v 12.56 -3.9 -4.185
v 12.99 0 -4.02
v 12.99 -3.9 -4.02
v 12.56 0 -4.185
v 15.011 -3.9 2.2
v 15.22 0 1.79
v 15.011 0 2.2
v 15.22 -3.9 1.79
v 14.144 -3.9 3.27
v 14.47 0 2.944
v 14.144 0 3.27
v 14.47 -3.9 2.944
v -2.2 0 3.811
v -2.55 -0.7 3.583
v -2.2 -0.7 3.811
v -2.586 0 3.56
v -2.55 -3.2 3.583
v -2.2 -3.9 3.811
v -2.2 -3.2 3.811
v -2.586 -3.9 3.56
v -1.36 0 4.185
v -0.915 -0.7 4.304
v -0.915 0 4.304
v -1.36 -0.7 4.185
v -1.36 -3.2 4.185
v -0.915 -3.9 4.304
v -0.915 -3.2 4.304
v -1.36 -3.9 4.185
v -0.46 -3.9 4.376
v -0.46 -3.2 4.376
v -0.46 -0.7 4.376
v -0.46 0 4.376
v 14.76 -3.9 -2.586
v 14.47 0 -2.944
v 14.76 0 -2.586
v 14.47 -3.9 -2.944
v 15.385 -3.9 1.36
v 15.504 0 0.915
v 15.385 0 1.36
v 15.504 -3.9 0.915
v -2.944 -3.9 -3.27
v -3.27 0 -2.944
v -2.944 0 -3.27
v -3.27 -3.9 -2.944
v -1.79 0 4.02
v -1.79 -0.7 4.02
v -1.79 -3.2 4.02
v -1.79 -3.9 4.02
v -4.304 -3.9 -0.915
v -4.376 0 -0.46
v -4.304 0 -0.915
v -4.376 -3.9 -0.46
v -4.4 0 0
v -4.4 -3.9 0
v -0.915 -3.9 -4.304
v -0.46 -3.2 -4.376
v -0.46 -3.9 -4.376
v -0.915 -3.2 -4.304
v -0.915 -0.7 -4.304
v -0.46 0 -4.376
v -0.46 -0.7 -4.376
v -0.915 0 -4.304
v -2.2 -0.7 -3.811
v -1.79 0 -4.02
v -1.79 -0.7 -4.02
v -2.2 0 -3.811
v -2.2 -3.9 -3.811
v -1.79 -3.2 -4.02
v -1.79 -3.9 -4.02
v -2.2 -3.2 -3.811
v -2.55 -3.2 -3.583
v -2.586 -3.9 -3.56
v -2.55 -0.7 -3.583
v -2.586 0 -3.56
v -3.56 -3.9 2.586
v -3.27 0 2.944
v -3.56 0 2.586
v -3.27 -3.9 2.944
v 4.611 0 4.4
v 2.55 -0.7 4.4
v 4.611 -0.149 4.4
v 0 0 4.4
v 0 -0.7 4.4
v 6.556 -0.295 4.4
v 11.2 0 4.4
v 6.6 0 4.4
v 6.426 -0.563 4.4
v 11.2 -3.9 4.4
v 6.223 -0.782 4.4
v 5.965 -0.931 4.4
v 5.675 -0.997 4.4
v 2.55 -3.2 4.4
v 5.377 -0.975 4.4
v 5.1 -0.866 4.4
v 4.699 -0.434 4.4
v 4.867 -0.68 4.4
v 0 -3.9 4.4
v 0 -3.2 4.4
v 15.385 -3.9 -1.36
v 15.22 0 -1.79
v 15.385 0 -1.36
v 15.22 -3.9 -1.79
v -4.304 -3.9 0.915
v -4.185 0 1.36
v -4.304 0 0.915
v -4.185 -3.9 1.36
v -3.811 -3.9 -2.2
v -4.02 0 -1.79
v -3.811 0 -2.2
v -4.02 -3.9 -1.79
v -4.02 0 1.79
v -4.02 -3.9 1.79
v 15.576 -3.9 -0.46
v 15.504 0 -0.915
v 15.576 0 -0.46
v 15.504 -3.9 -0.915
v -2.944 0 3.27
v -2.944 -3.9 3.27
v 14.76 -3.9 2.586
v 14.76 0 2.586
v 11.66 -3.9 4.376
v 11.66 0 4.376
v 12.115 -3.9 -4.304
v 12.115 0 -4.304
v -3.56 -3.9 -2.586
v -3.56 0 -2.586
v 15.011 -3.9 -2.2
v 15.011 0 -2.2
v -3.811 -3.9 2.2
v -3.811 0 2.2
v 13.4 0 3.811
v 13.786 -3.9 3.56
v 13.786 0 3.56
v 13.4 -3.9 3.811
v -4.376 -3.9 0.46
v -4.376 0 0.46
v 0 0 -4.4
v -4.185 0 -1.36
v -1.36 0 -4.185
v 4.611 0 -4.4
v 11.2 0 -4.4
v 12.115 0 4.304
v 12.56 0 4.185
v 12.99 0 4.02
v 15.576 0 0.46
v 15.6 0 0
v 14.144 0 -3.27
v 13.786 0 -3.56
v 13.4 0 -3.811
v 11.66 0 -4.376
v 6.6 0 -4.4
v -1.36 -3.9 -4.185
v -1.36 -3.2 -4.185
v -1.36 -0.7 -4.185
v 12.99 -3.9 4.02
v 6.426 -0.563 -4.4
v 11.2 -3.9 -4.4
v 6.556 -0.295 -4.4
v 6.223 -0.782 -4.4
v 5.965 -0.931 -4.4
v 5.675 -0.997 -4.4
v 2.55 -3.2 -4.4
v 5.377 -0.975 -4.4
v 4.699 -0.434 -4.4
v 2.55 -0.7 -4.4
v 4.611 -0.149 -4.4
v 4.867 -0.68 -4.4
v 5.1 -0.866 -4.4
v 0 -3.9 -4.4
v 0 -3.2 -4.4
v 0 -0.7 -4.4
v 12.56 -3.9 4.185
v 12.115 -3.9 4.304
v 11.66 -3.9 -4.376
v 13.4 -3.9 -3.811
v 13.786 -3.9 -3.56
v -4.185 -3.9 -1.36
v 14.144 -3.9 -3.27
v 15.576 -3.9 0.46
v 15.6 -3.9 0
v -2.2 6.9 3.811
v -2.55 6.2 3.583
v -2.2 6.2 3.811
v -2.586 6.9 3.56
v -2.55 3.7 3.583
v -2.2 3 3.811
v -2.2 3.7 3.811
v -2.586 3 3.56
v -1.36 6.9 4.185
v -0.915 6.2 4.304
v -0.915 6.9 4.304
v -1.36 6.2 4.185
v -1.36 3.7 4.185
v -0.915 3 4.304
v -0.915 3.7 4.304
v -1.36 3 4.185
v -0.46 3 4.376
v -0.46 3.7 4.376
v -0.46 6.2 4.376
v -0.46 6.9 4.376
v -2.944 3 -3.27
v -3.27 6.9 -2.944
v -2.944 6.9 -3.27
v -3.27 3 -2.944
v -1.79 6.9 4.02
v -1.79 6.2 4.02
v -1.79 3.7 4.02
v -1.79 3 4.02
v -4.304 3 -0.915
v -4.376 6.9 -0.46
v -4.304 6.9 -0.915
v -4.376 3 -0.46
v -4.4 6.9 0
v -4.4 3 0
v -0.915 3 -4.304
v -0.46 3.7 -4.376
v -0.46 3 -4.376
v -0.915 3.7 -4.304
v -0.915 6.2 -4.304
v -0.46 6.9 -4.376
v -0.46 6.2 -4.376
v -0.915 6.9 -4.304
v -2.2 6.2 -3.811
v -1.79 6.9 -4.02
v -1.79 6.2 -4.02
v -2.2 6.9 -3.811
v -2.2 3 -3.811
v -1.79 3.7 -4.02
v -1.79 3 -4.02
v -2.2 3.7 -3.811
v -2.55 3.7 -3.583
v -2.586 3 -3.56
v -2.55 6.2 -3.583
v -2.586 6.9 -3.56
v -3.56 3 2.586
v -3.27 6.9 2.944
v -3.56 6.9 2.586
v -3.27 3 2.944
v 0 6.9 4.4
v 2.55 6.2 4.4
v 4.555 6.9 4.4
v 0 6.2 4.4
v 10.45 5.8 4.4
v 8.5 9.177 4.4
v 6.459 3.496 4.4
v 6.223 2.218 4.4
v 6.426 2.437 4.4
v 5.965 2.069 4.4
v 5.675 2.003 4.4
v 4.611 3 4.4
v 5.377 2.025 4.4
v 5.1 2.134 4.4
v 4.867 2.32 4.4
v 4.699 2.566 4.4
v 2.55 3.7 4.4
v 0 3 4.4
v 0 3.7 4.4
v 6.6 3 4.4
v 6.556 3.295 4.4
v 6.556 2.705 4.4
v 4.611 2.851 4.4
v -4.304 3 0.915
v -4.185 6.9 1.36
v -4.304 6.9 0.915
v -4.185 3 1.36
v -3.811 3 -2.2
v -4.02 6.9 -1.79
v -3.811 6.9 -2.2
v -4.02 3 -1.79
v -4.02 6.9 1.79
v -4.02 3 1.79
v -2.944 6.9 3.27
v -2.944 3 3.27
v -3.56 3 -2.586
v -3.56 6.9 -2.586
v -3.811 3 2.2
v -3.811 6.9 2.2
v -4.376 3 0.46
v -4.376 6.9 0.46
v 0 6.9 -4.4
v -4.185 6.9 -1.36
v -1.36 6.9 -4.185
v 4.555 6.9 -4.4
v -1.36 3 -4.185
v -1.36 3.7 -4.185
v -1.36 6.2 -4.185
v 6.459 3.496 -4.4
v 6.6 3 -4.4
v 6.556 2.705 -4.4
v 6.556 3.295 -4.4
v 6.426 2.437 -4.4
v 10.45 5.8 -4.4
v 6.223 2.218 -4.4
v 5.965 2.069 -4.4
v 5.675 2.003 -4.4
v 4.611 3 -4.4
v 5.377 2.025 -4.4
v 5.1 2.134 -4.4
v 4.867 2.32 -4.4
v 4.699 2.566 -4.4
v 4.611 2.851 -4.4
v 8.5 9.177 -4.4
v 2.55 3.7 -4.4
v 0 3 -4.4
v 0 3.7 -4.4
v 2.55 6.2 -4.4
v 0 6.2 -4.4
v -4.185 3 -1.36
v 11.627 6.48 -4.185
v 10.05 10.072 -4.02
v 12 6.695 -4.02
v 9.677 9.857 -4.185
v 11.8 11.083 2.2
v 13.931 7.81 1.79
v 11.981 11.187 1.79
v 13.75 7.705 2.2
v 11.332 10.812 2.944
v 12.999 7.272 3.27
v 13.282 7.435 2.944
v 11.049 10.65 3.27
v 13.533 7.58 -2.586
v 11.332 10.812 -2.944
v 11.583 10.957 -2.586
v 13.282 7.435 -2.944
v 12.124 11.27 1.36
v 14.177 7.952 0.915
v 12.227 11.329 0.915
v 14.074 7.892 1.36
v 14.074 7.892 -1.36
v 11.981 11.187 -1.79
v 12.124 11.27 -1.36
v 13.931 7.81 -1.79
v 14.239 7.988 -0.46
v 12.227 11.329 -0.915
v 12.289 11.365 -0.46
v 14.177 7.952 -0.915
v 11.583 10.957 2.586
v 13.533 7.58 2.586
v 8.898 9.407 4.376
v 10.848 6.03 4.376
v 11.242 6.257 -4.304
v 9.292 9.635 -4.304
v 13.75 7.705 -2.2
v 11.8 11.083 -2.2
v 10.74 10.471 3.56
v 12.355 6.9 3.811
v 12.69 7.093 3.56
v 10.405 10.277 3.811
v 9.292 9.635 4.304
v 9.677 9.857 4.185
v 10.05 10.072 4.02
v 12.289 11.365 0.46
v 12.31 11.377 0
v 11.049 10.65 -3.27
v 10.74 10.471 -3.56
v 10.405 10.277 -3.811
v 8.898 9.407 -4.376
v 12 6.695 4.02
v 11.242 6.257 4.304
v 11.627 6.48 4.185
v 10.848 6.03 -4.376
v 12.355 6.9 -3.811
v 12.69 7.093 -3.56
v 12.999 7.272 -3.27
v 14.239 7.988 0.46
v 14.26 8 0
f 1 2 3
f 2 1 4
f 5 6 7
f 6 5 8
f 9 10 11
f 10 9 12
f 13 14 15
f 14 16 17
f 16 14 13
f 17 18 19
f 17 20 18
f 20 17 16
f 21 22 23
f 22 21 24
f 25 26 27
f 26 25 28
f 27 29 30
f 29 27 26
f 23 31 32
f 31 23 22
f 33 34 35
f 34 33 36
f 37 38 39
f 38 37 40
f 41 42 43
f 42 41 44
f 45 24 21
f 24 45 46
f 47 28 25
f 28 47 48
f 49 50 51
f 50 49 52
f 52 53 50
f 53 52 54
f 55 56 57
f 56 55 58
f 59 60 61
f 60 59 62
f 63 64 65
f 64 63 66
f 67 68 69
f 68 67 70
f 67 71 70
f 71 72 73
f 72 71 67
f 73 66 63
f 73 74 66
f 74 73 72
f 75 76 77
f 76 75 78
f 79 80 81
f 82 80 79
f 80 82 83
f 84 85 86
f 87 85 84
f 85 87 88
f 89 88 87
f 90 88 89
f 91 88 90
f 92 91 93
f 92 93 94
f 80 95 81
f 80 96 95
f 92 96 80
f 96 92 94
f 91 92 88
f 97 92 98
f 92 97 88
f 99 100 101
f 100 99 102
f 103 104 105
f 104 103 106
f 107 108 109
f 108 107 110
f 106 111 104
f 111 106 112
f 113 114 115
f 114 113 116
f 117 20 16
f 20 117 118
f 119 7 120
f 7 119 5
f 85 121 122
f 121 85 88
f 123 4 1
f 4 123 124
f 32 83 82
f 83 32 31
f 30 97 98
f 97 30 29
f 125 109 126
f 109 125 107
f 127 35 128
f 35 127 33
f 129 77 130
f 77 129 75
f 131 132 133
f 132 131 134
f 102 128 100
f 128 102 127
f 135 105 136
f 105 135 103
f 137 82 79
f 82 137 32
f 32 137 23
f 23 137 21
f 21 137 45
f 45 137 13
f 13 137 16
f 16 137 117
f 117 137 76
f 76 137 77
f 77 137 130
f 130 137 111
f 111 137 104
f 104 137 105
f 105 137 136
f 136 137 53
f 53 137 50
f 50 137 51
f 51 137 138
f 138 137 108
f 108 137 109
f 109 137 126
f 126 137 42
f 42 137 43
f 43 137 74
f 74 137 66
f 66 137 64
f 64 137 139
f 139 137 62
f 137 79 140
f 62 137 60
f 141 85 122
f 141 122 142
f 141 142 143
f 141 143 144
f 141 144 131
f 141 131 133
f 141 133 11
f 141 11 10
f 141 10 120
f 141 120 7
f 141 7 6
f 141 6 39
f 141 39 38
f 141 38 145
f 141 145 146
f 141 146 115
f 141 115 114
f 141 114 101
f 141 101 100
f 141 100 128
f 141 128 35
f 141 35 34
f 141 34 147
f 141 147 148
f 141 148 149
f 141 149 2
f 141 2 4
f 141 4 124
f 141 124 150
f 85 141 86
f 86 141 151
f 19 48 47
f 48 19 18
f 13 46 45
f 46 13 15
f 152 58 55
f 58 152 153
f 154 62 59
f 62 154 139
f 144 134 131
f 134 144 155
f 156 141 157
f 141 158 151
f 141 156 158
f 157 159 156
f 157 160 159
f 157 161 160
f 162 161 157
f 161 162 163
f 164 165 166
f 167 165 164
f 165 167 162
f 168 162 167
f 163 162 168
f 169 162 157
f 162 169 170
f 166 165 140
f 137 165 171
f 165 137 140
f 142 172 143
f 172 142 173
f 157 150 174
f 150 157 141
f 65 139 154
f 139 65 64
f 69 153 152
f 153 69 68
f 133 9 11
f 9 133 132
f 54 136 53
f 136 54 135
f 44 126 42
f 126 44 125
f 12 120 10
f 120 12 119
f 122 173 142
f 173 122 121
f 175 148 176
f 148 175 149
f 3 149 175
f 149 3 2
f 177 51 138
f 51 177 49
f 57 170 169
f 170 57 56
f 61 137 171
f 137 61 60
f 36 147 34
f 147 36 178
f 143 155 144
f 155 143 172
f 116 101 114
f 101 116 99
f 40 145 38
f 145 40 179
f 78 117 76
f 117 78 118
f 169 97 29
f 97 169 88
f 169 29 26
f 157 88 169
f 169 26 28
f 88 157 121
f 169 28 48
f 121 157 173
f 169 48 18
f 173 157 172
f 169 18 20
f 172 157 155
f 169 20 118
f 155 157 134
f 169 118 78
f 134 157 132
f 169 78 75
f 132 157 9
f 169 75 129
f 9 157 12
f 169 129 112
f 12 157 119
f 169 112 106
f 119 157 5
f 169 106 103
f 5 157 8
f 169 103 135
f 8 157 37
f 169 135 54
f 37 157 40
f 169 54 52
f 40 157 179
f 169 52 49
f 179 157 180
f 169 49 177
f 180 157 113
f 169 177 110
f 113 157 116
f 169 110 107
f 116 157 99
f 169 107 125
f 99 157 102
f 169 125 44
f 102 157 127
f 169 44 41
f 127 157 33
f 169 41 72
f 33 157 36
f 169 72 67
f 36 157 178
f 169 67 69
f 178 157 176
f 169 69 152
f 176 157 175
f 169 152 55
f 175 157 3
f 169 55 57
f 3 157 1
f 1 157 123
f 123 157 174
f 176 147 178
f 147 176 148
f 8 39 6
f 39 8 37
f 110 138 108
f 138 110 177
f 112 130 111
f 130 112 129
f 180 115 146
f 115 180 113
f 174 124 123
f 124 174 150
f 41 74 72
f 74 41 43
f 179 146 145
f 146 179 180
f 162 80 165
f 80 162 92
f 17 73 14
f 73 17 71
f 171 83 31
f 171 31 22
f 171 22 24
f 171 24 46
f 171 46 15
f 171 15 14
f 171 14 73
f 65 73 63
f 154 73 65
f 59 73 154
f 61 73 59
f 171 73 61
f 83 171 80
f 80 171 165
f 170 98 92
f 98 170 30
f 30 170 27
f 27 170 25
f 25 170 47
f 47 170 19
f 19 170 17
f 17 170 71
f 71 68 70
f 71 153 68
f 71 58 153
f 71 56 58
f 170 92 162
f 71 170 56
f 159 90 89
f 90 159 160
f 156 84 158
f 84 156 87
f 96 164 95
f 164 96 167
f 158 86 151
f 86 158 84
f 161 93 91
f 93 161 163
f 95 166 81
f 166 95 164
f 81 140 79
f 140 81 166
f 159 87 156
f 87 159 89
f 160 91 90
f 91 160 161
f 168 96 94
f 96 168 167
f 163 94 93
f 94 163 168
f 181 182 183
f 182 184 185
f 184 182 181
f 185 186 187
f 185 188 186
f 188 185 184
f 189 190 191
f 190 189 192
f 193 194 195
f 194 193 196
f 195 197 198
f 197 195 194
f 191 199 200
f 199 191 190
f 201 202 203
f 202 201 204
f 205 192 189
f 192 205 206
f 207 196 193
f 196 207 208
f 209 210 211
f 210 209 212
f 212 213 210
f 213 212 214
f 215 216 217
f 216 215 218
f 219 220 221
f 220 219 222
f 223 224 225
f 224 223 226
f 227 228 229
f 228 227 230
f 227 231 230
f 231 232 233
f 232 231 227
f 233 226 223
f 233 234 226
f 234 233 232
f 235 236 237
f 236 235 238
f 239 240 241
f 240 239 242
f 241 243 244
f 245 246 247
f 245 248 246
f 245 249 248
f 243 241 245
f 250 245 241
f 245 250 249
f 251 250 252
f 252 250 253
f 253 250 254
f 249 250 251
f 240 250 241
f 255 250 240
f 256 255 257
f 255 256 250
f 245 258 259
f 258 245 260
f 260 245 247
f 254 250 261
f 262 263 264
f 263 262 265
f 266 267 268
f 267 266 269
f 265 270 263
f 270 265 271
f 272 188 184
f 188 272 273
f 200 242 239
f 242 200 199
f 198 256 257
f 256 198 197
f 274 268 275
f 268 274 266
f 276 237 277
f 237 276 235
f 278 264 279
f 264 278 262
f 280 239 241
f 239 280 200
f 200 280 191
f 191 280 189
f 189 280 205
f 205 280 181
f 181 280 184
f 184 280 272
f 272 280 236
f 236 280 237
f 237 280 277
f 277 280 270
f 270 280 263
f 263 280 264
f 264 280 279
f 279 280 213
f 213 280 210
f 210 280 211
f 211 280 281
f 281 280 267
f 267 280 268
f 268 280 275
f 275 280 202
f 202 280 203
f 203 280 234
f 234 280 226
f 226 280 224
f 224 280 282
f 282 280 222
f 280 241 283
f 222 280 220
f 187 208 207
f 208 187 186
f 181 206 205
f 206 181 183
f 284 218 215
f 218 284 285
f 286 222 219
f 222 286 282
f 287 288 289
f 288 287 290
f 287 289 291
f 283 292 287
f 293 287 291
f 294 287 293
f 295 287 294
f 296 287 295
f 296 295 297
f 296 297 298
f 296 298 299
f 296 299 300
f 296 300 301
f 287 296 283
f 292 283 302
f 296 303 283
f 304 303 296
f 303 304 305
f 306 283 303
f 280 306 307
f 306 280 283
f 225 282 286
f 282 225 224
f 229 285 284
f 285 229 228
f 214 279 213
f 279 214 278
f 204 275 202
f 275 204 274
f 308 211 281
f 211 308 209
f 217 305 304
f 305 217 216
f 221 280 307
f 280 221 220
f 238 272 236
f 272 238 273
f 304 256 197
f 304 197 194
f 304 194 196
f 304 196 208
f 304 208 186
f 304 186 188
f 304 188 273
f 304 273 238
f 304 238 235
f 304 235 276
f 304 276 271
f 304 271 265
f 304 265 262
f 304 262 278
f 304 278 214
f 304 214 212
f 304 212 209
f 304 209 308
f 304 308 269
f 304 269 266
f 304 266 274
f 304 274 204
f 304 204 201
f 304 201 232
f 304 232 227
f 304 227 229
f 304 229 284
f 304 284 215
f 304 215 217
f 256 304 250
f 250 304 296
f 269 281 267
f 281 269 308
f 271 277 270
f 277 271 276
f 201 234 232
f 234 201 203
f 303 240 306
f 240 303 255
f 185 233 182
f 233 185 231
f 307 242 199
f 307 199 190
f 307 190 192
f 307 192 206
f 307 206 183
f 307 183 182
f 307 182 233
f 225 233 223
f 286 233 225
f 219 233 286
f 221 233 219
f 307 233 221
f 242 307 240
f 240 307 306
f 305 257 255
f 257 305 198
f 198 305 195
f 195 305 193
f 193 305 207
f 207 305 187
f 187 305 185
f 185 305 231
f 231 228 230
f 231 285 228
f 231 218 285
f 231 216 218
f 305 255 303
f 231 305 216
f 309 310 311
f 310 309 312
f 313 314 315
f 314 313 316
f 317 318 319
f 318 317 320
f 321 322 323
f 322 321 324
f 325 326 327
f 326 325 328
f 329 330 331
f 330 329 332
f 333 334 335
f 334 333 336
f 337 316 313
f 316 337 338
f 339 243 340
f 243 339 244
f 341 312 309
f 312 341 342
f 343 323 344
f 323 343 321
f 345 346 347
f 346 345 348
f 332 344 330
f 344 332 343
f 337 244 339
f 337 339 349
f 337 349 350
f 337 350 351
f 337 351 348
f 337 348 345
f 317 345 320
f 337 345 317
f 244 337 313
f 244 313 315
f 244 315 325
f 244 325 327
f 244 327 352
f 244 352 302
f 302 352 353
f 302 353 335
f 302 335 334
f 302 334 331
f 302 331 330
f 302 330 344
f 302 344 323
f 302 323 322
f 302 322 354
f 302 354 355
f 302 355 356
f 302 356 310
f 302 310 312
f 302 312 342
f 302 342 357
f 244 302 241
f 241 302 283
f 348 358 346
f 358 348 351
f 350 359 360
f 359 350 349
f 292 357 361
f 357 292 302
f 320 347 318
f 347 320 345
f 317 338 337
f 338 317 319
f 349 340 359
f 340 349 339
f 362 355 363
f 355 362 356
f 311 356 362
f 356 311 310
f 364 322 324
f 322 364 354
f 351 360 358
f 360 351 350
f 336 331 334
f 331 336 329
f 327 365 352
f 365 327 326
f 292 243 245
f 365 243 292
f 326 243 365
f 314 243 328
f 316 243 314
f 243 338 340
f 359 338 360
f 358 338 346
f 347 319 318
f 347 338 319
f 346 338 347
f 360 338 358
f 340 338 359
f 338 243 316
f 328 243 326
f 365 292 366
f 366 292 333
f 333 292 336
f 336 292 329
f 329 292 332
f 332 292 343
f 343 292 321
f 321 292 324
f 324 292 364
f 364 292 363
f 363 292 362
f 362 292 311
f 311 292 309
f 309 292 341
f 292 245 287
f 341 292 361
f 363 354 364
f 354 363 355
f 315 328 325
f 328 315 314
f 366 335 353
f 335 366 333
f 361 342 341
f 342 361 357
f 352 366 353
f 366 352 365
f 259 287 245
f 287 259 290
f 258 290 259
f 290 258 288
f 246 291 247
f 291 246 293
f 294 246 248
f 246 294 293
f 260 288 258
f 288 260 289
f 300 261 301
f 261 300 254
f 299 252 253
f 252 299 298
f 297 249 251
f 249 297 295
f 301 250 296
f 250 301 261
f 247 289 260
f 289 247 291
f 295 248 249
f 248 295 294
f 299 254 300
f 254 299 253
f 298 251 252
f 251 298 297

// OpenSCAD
// Title: SmallMagnetClip
// Author: http://www.thingiverse.com/Jinja
// Date: 2018-05-12

/////////// START OF PARAMETERS /////////////////

MagnetDiam = 4.8;           
MagnetThickness = 2.2;      
MinThickness = 0.7;         //[0.5:0.05:1.0]
Tolerance = 5;              //[0:10]
ClipLength = 20;            
FulcrumPosition = 0.5;      //[0.0:0.1:1.0]
Angle = 30;                 //[10:5:40]
Model = "clip"; // [clip:The magnet clip,test:The tolerance hole test]

/////////// END OF PARAMETERS /////////////////

$fs=0.3*1;
$fa=6*1; //smooth
//$fa=20; //rough

tolScale = 1.0/20.0;
tolOffset = -0.1 * 1;
gap = ((Tolerance*tolScale)+tolOffset);
rad = (MagnetDiam/2);
clipRad = rad+2;
clipInnerLength = ClipLength-2*clipRad;
holeRad = rad + gap;
magHoleThickness = MagnetThickness + 2*gap;
hingeRad = 1*1;
hingeHoleRad = hingeRad+gap;
ClipThickness = magHoleThickness + MinThickness * 2;
lidFrameHeight = 8*1;

if(Model=="test")
{
    translate([0,ClipThickness*3+3,0]) TestHoles();
}
else
{
    ClipPart1();
    translate([0,ClipThickness+3,0]) ClipPart2();
}

module ClipPart1()
{
    offset1 = clipInnerLength*FulcrumPosition;
    difference()
    {
        SimpleClipPart2b();
        translate([offset1,0,-clipRad-1])
        cylinder(clipRad*2+2,hingeRad,hingeRad);
    }
}

module ClipPart2()
{
    angle = Angle;
    offset1 = clipInnerLength*FulcrumPosition;
    offset2 = 0.0;
    difference()
    {
        SimpleClipPart2();
        translate([ClipLength*0.5+offset1+offset2,0,0])
        cube([ClipLength,ClipLength,ClipLength],true);
    }
    translate([offset1,-ClipThickness,0])
    rotate([0,0,angle])
    translate([-offset1,ClipThickness,0])
    difference()
    {
        SimpleClipPart2();
        translate([-ClipLength*0.5+offset1-offset2,0,0])
        cube([ClipLength,ClipLength,ClipLength],true);
    }
    translate([offset1,-ClipThickness,-clipRad])
    cylinder(clipRad*2,hingeRad,hingeRad);
}

module SimpleClipPart2()
{
    
    difference()
    {
        rotate([90,0,0])
        hull()
        {
            cylinder(ClipThickness, clipRad,clipRad);
            translate([clipInnerLength,0,0])
            cylinder(ClipThickness, clipRad,clipRad);
        }
        translate([0,-magHoleThickness*0.5 - MinThickness,-1])
        cube([holeRad*2,magHoleThickness,clipRad*2+3], true);
    }
}

module SimpleClipPart2b()
{
    
    difference()
    {
        rotate([90,0,0])
        hull()
        {
            cylinder(ClipThickness, clipRad,clipRad);
            translate([clipInnerLength,0,0])
            cylinder(ClipThickness, clipRad,clipRad);
        }
        translate([0,-magHoleThickness*0.5 - MinThickness,-1])
        cube([holeRad*2,magHoleThickness,clipRad*2+3], true);
    }
}

module TestHoles()
{
    biggap = ((10*tolScale)+tolOffset);
    outLength = MagnetDiam + 3 + biggap;
    difference()
    {
        union()
        {
            for(tol=[0:1:10])
            {
                gap = ((tol*tolScale)+tolOffset);
                holeThick = MagnetThickness + 2*gap;
                outThick = holeThick + MinThickness * 2;
                holeLength = MagnetDiam + 2*gap;
                hingeHoleRad = hingeRad+gap;

                translate([tol*outLength,0,0])
                cube([outLength,outThick,clipRad*2]);
            }
        }
        
        for(tol=[0:1:10])
        {
            gap = ((tol*tolScale)+tolOffset);
            holeThick = MagnetThickness + 2*gap;
            outThick = holeThick + MinThickness * 2;
            holeLength = MagnetDiam + 2*gap;
            hingeHoleRad = hingeRad+gap;

            translate([1.5,0,0])
            translate([tol*outLength,MinThickness,-1])
            cube([holeLength, holeThick, clipRad*2+2]);
        }
    }
}

module HHole(depth, rad)
{
    b = 0.5;
    bezel = min(b, depth);
    translate([0,0,-0.01])
    cylinder(0.015, rad+bezel, rad+bezel);
    cylinder(bezel, rad+bezel, rad);
    if(depth>b)
    {
        translate([0,0,bezel-0.01])
        cylinder(depth-bezel, rad, rad);
    }
}

module VHole(depth, rad)
{
    rotate([90,0,0])
    cylinder(depth, rad, rad);
    rotate([0,-45,0])
    translate([0,-depth,0])
    cube([rad, depth, rad]);
}
